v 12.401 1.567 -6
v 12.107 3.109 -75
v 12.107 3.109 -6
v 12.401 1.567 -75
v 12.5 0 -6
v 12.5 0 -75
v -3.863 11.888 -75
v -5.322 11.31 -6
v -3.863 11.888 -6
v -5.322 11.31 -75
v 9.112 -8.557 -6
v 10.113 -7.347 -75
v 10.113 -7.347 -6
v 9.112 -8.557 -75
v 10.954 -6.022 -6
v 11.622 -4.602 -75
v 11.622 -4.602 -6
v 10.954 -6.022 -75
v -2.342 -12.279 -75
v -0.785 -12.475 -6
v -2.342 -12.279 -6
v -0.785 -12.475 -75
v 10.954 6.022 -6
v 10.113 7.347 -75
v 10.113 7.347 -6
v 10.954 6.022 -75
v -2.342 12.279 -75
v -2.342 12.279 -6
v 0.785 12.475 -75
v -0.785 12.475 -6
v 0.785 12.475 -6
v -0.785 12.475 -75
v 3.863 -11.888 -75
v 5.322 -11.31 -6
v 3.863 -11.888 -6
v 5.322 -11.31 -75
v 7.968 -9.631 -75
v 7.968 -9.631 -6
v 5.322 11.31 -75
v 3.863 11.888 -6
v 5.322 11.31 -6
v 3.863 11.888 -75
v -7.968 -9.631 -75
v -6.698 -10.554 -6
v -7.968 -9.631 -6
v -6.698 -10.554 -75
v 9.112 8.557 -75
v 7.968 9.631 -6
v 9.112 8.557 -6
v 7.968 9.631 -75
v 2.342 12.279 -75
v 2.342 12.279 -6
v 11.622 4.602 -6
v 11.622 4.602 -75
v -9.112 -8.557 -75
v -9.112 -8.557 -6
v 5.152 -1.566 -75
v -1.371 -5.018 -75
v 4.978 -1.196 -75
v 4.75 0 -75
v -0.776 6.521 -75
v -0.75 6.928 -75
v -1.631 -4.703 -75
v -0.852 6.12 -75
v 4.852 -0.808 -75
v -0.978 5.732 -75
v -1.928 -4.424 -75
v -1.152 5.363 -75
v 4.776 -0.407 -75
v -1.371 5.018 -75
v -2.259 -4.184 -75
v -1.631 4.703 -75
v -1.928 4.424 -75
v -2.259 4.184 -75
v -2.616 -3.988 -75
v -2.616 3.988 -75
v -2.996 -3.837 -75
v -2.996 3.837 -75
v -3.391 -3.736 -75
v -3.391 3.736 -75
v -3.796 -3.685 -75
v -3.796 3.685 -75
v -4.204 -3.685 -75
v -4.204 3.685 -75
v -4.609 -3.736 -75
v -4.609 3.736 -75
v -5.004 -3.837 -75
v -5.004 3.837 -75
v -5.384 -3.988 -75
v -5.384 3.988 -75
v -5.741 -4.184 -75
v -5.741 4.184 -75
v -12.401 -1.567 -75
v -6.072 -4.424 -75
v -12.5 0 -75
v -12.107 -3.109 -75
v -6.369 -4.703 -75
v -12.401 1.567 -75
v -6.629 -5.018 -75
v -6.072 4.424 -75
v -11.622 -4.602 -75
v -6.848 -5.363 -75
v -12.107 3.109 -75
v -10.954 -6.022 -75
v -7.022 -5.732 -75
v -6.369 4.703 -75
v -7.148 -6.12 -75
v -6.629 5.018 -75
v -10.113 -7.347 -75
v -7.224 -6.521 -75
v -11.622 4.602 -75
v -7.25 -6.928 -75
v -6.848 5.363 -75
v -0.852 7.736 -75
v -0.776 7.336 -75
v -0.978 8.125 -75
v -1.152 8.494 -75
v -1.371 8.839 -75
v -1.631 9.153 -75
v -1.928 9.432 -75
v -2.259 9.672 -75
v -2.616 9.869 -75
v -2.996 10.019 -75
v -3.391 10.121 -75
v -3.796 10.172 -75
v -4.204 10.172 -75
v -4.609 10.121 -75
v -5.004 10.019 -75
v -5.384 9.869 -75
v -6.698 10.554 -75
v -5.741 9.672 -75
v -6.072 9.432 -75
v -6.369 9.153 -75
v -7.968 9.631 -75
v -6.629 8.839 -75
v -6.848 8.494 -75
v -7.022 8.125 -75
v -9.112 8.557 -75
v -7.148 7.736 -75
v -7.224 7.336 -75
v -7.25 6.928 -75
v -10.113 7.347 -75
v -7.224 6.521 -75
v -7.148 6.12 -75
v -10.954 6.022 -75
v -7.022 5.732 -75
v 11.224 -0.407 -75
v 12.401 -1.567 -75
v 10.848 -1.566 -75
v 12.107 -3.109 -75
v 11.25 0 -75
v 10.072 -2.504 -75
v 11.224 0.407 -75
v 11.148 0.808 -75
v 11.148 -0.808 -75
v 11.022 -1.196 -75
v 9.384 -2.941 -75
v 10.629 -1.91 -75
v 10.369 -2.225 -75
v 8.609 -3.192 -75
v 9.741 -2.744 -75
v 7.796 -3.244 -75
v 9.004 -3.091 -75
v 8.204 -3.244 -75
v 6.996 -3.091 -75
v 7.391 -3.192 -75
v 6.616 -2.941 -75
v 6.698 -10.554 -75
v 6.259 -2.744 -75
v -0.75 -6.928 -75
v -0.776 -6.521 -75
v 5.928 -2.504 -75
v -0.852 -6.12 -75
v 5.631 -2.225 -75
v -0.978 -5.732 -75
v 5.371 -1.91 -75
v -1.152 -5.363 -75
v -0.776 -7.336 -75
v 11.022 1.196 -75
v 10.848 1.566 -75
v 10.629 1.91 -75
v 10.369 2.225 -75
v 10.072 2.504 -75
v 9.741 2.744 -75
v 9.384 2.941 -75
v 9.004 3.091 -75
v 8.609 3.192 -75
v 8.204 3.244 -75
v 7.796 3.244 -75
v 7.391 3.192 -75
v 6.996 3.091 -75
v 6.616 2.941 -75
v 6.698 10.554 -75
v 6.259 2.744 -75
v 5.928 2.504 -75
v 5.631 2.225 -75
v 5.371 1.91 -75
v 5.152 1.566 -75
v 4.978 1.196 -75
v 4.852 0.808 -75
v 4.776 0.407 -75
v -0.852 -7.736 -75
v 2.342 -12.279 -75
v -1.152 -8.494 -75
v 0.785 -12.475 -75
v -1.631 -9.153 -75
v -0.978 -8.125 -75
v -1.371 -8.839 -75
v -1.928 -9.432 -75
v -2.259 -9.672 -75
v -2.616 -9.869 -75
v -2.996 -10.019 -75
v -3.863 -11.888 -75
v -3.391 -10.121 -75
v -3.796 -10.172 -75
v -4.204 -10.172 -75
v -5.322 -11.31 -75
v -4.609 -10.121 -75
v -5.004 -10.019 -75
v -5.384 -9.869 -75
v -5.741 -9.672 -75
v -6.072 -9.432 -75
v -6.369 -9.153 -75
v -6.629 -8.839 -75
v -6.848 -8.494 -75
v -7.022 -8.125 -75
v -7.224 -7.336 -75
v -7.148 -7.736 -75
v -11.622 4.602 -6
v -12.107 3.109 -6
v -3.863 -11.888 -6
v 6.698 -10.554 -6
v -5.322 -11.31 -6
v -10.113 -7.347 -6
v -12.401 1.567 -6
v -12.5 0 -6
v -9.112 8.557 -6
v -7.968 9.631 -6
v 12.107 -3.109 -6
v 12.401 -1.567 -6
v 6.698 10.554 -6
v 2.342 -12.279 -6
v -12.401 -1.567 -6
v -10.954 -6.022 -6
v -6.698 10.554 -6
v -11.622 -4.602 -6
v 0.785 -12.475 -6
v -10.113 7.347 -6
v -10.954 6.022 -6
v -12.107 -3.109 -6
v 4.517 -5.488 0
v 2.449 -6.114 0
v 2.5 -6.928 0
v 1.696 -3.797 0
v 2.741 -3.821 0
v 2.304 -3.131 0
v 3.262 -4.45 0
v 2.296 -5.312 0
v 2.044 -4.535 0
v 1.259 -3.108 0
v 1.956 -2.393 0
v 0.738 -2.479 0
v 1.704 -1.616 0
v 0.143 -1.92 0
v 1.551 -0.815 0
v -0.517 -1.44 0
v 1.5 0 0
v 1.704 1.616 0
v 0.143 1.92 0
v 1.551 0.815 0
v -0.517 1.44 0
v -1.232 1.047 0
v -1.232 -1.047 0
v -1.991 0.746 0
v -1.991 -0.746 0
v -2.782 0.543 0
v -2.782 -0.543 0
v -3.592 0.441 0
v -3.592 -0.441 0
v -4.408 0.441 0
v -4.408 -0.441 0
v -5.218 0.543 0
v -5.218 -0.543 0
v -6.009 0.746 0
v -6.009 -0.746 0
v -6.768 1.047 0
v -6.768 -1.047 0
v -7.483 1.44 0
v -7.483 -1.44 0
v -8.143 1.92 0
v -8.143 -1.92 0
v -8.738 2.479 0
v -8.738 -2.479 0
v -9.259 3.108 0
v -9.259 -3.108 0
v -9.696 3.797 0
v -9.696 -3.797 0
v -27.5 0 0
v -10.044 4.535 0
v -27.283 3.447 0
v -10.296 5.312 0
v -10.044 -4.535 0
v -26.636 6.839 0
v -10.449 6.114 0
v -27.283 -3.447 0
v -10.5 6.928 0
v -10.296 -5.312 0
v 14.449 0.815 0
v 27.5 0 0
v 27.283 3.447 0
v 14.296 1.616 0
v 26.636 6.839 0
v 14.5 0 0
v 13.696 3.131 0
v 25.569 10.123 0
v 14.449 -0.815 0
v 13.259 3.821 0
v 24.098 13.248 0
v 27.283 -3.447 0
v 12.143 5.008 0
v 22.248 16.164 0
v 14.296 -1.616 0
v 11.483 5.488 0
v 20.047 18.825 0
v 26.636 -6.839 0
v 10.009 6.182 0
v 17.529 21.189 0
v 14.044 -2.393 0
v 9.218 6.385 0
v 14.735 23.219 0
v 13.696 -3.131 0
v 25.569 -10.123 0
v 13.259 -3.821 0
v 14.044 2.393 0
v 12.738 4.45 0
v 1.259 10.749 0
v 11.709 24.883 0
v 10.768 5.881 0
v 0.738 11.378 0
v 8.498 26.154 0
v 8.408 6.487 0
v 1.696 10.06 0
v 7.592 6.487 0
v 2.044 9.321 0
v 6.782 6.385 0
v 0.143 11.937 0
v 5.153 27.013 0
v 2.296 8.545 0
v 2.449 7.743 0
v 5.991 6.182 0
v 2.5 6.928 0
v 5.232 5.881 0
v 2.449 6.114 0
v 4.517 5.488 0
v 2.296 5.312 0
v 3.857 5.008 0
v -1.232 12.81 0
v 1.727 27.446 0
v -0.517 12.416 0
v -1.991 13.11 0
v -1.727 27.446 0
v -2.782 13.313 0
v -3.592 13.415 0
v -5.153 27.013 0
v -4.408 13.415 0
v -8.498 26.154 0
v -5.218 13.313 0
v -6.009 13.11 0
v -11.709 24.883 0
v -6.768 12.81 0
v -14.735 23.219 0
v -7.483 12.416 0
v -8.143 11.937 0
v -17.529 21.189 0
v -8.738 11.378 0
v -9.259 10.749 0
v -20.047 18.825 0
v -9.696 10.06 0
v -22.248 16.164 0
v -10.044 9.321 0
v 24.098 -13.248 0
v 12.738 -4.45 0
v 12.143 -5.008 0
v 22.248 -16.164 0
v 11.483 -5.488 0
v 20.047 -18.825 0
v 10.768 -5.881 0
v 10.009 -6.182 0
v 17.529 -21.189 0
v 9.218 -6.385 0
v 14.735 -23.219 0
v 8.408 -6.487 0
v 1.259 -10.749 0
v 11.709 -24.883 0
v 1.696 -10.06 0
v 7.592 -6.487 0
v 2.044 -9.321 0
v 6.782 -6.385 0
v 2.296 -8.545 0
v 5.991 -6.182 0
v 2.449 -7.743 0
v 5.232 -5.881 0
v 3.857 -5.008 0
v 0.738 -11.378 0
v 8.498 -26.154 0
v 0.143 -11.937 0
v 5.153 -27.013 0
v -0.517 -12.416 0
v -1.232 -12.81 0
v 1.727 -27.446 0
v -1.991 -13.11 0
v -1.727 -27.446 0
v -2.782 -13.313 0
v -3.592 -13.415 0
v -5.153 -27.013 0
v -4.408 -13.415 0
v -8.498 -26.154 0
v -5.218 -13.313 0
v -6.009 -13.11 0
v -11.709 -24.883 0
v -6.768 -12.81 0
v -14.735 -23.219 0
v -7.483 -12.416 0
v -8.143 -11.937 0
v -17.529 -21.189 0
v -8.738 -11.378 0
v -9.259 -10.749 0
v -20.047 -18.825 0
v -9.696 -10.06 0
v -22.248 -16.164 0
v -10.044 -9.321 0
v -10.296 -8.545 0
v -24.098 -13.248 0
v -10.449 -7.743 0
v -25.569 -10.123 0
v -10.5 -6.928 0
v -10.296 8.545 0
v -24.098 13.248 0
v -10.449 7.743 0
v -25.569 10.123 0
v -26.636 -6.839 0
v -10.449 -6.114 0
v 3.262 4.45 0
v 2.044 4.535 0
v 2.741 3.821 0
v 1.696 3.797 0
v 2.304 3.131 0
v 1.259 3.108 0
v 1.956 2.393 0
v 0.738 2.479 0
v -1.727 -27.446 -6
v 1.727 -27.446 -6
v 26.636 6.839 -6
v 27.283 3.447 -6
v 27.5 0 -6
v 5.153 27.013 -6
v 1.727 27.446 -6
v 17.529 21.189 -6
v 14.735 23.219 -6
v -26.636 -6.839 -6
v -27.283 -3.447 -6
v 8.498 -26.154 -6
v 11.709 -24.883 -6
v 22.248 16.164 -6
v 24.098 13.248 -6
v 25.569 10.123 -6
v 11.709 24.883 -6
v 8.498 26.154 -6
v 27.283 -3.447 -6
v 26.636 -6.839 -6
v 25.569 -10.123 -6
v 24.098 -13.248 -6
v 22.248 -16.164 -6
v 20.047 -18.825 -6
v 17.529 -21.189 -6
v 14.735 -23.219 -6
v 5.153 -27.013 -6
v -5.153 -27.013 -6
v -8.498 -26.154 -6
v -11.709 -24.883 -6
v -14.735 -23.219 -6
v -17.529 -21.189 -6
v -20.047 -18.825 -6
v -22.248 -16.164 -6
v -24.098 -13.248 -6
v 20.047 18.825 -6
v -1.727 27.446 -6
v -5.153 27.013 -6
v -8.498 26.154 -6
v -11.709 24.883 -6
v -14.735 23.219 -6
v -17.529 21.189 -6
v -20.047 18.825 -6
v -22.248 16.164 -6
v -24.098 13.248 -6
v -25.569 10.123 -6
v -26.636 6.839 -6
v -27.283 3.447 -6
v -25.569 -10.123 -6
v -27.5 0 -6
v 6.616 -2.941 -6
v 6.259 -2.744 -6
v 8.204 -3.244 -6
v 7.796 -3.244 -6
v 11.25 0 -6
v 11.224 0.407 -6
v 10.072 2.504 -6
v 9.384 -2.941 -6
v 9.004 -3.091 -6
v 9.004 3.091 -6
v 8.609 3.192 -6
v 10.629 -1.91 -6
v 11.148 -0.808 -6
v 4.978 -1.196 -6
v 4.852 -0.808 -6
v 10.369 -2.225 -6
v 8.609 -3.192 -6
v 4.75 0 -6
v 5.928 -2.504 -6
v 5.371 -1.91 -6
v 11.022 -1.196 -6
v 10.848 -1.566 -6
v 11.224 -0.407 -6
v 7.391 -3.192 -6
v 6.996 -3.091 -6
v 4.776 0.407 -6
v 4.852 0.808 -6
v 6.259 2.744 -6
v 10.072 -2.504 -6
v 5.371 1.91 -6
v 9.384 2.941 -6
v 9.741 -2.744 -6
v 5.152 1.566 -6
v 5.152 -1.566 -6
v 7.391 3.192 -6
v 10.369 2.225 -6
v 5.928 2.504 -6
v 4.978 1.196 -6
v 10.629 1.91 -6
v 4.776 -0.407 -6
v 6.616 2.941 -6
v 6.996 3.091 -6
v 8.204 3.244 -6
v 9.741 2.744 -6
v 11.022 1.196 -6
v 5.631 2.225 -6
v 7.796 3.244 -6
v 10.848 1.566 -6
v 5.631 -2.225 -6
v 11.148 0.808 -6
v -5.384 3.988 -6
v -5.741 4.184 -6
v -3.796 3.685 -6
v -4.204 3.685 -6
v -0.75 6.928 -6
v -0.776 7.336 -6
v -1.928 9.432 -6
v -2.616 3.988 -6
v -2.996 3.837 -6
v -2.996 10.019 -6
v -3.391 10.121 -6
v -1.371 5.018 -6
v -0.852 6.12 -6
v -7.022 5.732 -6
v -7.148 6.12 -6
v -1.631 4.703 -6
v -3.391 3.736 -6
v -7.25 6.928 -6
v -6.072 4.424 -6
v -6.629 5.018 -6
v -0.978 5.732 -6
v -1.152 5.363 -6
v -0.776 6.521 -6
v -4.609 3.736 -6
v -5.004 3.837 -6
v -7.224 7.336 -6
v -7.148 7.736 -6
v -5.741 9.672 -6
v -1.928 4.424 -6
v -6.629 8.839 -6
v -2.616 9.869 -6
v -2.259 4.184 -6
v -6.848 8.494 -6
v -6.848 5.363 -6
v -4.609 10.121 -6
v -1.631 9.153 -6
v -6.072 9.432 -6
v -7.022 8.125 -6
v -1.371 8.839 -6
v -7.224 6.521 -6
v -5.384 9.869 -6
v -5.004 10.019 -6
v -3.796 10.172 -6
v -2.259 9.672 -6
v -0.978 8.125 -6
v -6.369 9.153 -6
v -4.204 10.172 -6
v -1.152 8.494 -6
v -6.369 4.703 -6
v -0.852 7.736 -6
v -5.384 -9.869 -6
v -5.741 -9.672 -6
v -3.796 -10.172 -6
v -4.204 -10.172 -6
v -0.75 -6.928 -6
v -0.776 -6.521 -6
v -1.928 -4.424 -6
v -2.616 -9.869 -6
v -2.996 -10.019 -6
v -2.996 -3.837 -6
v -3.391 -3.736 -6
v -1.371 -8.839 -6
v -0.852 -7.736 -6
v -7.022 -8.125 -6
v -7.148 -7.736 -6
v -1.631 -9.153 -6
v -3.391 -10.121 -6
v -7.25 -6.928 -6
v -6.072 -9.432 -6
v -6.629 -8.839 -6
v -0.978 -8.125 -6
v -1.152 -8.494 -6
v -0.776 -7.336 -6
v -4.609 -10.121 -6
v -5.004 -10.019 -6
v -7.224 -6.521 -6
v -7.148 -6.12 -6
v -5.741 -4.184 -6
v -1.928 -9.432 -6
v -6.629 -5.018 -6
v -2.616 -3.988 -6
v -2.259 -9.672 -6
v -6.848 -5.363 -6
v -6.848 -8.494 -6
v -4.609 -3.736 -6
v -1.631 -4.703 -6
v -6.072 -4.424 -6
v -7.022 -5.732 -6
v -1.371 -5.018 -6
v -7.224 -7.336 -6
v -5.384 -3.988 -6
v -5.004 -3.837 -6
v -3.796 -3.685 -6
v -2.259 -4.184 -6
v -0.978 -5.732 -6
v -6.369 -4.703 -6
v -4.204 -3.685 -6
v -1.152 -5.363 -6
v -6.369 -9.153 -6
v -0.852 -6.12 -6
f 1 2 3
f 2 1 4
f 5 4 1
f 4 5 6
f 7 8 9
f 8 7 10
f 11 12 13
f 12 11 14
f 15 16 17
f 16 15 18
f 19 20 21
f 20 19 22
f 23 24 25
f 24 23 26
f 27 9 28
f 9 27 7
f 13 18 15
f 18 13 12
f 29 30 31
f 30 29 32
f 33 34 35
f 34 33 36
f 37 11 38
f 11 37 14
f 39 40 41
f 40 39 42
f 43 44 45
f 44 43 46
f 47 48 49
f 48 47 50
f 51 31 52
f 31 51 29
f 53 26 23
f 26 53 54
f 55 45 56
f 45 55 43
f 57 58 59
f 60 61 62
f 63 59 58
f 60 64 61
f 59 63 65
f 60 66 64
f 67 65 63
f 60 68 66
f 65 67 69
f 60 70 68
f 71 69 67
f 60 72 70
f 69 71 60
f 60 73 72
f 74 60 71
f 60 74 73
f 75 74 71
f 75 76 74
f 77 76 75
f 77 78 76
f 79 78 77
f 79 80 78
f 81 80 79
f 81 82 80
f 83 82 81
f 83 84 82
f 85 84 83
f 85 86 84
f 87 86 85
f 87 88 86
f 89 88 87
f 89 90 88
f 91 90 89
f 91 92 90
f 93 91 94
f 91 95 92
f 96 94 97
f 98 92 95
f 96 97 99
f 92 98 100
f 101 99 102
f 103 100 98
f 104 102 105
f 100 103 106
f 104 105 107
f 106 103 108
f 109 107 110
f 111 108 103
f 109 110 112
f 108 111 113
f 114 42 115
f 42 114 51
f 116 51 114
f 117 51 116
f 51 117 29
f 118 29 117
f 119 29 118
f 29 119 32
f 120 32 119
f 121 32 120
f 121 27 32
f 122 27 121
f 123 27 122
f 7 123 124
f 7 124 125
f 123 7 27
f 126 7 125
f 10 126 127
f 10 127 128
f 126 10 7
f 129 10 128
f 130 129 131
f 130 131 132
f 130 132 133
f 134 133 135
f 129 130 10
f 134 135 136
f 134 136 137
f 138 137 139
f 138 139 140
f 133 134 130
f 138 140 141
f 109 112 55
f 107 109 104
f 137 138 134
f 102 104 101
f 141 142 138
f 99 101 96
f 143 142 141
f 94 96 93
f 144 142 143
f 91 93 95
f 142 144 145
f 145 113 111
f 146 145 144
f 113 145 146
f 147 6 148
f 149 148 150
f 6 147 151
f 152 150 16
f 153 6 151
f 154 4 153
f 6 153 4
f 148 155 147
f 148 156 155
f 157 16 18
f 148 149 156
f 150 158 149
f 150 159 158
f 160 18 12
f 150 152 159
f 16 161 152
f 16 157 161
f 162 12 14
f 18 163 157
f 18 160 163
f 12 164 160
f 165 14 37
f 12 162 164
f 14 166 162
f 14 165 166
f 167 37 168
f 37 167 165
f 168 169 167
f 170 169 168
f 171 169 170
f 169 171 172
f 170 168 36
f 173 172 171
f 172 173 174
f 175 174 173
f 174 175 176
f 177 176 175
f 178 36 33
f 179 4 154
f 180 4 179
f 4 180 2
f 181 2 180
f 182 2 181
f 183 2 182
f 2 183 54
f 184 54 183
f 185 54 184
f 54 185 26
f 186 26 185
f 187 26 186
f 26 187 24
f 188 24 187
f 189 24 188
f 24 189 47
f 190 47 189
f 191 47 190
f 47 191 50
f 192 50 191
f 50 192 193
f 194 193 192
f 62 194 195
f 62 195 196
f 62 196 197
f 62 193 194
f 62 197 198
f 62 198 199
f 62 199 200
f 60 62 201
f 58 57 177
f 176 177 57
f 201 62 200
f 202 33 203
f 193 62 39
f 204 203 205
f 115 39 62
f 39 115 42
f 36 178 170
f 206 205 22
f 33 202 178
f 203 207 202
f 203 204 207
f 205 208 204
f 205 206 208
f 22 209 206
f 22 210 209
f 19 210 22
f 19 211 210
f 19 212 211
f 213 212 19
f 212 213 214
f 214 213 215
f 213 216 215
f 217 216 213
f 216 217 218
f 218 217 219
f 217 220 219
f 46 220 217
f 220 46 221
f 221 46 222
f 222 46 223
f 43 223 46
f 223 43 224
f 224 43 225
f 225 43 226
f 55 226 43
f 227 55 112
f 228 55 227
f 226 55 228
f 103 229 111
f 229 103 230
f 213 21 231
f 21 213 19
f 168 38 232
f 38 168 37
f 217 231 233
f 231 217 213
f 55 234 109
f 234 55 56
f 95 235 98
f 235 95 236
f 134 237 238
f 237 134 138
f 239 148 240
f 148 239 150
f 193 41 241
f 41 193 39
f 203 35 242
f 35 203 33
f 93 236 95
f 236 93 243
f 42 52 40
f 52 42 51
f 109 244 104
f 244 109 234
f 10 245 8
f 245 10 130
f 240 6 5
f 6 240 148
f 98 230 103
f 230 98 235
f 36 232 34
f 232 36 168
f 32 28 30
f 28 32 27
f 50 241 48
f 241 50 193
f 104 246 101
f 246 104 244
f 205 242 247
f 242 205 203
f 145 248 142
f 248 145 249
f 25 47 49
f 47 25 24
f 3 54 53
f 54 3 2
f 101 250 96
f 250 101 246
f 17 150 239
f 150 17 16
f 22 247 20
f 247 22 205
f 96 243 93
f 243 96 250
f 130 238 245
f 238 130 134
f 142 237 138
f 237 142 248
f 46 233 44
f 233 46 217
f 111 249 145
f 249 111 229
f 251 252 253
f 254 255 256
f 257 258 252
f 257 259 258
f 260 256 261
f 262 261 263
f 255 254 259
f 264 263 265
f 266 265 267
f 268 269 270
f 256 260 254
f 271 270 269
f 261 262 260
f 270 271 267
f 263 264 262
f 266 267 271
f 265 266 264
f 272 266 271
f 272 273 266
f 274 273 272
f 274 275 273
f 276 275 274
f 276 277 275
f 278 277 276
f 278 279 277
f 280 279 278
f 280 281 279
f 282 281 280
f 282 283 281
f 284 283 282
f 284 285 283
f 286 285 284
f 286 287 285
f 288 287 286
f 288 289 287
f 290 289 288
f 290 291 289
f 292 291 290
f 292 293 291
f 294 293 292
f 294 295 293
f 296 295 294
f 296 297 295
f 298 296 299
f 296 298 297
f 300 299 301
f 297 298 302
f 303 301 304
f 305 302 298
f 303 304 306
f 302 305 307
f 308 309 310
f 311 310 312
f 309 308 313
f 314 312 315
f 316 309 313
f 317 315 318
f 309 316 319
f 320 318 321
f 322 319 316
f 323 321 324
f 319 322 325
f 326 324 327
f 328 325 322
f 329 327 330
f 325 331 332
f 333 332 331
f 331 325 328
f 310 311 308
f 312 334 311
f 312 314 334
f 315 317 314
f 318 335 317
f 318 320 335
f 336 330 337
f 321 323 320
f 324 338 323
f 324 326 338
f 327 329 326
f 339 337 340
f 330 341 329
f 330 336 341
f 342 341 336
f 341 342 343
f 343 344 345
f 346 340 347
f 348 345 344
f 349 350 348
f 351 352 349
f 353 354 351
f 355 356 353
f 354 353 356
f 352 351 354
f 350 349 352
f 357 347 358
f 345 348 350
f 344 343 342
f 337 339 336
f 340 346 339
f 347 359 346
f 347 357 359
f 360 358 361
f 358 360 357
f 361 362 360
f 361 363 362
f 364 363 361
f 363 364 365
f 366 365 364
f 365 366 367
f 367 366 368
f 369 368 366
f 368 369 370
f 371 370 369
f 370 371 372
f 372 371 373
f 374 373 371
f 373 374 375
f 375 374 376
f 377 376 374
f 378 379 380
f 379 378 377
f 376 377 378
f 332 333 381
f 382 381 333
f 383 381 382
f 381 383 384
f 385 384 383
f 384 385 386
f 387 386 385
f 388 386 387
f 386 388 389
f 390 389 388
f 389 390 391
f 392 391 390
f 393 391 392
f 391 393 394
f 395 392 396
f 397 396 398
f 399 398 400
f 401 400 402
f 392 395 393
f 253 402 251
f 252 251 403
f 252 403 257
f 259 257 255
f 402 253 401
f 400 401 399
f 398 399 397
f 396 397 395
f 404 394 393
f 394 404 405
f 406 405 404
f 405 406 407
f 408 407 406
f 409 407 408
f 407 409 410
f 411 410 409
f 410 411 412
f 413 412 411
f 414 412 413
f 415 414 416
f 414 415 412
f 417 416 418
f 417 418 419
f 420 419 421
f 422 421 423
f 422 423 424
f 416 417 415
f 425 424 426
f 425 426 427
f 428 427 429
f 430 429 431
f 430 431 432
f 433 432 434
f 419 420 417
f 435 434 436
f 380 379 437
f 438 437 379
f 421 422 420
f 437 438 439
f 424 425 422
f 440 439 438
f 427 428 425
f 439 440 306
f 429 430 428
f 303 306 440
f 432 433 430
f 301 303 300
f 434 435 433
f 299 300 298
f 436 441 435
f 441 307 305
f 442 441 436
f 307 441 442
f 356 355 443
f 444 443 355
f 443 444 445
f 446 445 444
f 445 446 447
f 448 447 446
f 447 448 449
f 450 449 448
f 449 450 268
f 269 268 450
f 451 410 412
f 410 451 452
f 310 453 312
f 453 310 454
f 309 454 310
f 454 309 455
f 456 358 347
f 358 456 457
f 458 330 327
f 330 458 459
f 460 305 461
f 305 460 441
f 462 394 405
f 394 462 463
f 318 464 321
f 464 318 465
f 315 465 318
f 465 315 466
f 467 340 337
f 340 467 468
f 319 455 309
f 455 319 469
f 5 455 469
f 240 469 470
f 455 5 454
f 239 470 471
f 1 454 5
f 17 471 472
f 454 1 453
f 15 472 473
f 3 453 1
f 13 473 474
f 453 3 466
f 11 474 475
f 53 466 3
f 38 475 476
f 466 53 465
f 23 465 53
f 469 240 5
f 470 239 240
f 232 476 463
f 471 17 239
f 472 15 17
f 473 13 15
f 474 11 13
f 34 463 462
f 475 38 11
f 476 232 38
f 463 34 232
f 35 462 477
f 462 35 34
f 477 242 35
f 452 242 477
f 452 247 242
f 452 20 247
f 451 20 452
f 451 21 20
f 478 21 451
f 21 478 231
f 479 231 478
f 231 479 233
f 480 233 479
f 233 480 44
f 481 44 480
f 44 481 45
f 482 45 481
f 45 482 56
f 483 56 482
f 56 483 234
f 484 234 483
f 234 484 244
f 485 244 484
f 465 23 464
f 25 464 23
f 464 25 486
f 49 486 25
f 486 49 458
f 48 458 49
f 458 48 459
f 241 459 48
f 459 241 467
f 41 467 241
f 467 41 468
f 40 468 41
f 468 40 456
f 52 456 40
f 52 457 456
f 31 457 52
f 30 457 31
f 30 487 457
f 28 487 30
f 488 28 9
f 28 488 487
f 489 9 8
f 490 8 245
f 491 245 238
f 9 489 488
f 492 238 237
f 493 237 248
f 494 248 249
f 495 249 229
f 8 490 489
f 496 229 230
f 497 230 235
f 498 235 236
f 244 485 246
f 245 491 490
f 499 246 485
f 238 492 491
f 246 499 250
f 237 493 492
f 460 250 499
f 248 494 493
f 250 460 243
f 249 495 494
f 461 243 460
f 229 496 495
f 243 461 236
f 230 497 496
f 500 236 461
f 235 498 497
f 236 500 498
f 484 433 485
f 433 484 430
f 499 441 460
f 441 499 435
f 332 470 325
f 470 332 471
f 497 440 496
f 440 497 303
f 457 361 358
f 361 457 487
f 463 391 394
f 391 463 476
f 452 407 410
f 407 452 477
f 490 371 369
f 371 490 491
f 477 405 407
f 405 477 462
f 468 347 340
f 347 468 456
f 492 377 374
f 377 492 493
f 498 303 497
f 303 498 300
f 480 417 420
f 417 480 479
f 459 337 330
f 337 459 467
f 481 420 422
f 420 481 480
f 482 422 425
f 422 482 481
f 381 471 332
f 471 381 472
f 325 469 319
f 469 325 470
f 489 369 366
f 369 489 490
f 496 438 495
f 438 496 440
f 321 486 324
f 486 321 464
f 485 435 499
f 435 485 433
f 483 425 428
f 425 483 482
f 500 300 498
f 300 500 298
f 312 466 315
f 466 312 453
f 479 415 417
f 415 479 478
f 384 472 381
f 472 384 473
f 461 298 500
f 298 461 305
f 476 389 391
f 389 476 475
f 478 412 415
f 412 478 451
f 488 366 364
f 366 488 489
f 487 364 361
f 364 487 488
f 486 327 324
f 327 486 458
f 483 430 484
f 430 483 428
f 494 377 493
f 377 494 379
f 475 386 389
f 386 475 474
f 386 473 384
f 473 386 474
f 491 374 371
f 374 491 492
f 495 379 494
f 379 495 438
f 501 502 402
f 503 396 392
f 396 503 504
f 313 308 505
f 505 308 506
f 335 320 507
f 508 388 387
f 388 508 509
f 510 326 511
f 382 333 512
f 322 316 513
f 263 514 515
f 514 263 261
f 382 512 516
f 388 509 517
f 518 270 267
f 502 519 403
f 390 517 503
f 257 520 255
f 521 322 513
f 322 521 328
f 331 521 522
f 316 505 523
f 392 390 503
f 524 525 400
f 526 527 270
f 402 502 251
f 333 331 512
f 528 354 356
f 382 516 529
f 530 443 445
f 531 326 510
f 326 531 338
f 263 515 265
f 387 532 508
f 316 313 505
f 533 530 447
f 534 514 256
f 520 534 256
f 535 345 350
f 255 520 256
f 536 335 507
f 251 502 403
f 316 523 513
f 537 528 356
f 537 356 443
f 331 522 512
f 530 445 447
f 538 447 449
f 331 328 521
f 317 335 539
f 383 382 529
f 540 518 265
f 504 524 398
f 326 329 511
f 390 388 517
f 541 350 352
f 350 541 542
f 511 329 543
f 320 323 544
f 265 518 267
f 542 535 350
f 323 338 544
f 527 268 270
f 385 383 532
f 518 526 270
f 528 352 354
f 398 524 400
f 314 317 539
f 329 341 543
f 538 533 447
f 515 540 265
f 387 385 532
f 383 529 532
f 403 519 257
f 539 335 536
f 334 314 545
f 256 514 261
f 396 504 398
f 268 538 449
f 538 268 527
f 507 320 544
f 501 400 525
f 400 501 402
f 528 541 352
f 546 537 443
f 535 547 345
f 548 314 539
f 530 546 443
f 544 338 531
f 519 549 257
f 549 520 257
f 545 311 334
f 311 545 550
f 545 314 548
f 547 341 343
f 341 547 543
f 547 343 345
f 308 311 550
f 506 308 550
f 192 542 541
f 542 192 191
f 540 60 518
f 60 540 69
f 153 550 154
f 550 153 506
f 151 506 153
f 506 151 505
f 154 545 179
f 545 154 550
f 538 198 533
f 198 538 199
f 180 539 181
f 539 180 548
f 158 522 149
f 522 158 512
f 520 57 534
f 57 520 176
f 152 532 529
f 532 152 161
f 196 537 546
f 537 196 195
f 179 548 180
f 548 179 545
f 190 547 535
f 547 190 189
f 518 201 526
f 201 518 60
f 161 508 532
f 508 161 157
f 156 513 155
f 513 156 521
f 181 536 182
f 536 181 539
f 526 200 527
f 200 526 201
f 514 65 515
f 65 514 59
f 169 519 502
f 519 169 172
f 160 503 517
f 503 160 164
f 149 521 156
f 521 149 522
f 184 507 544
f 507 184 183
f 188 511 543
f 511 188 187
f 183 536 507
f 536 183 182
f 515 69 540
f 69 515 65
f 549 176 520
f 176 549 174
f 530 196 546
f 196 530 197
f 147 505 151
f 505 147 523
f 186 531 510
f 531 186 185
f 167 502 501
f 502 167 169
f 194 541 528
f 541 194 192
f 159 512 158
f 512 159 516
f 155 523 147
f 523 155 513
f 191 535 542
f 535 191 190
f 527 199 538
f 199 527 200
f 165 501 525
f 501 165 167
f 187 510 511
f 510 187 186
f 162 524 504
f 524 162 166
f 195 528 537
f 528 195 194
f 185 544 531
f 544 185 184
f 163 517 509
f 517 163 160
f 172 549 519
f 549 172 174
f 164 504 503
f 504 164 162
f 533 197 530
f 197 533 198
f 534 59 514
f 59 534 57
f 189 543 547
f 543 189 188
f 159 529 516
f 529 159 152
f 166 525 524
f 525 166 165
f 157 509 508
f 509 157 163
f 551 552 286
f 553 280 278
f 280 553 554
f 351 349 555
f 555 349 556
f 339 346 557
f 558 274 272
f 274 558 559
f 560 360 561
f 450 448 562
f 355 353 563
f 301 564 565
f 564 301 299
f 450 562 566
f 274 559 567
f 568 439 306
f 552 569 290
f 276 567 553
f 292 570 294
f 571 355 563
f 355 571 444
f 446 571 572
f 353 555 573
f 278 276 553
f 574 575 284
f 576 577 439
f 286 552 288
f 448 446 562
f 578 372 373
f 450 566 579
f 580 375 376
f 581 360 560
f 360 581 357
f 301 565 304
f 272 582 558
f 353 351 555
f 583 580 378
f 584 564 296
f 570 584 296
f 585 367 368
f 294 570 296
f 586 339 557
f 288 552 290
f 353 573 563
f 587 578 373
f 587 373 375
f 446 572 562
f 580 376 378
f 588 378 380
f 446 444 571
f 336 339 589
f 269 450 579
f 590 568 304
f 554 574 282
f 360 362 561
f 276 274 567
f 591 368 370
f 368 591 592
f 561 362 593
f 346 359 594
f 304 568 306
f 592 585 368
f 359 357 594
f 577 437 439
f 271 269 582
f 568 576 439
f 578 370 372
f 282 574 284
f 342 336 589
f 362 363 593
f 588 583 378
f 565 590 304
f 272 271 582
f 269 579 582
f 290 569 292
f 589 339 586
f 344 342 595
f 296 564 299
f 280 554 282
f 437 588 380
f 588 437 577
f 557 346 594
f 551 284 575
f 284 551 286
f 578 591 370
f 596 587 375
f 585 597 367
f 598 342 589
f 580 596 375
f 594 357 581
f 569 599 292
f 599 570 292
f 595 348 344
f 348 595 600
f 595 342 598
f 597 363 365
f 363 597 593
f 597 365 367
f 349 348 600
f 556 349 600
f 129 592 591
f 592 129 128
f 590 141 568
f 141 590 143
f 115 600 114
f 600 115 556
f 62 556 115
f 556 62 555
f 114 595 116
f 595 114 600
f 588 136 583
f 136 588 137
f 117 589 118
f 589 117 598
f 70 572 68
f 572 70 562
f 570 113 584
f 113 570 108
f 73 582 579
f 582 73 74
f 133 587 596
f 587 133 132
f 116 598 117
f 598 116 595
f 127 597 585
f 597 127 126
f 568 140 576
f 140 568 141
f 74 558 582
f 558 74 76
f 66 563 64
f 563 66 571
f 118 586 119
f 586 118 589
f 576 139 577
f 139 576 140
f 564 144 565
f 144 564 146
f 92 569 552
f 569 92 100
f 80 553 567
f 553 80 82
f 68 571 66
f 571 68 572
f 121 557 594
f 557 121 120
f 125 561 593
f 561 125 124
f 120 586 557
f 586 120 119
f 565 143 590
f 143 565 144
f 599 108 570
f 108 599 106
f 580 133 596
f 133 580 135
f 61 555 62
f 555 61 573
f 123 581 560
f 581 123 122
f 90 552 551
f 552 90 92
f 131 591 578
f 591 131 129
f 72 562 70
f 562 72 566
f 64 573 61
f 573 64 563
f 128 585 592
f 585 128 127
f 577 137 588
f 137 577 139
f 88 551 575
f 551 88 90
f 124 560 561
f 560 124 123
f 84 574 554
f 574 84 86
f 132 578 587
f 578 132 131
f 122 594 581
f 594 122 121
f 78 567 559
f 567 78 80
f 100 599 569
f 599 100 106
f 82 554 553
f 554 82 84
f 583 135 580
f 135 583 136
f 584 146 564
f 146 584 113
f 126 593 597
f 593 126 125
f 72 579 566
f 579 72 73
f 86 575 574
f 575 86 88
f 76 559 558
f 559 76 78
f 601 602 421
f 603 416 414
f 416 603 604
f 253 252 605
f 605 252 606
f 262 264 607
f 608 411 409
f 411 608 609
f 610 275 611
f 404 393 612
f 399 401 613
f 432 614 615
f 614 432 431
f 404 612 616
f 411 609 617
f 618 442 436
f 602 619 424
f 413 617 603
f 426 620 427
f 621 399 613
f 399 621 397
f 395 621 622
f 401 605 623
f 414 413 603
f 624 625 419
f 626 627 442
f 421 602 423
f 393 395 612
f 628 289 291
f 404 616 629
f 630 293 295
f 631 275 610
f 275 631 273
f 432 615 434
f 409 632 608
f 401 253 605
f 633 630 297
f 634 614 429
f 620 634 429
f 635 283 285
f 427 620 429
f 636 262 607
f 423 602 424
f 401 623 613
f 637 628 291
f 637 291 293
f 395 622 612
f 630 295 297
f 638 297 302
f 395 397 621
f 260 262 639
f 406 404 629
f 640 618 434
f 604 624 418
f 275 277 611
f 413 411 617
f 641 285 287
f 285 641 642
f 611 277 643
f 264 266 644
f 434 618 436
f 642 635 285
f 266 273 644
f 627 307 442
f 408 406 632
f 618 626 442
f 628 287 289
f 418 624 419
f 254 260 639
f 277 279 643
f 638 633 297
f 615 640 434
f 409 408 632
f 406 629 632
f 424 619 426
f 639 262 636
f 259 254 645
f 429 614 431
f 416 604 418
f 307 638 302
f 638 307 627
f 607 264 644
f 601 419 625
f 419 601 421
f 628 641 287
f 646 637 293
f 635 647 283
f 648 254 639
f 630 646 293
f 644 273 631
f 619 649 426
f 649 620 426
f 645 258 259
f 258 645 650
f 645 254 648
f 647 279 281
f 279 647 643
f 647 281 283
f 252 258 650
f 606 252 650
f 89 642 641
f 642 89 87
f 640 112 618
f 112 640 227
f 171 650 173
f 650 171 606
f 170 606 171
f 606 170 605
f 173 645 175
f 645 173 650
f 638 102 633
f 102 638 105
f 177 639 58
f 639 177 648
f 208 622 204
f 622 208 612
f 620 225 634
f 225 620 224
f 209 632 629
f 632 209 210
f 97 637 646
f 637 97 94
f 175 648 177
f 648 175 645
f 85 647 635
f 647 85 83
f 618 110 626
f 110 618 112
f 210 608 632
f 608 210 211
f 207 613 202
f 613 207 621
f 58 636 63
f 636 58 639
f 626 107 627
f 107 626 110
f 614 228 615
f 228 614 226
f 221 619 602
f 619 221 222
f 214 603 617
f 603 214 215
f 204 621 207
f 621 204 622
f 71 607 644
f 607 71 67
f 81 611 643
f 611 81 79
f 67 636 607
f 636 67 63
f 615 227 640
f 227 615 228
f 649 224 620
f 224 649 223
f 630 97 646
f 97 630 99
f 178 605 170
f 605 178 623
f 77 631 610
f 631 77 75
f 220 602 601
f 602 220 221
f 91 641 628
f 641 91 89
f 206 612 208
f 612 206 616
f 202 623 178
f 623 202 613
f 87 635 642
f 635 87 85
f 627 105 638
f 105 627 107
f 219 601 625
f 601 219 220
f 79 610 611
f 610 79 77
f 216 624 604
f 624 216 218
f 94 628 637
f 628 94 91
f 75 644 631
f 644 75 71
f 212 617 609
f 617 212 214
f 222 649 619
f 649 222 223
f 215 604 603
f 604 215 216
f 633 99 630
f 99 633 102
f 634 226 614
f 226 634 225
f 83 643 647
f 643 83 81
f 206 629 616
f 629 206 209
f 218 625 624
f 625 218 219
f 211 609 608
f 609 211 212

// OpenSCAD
$fn = 50;


difference() {
	union() {
		translate(v = [0, 0, -75.0000000000]) {
			cylinder(h = 75, r = 12.5000000000);
		}
		translate(v = [0, 0, -6.0000000000]) {
			cylinder(h = 6, r = 27.5000000000);
		}
	}
	union() {
		translate(v = [8.0000000000, 0.0000000000, 0]) {
			rotate(a = [0, 0, 0]) {
				difference() {
					union() {
						#translate(v = [0, 0, -75.0000000000]) {
							cylinder(h = 75, r = 2.2500000000);
						}
						#translate(v = [0, 0, -6]) {
							cylinder(h = 6, r = 12.5000000000, r1 = 3.2500000000, r2 = 6.5000000000);
						}
						#translate(v = [0, 0, -75.0000000000]) {
							cylinder(h = 75, r = 3.2500000000);
						}
						#translate(v = [0, 0, -75.0000000000]) {
							cylinder(h = 75, r = 2.2500000000);
						}
					}
					union();
				}
			}
		}
		translate(v = [-4.0000000000, 6.9282032303, 0]) {
			rotate(a = [0, 0, 0]) {
				difference() {
					union() {
						#translate(v = [0, 0, -75.0000000000]) {
							cylinder(h = 75, r = 2.2500000000);
						}
						#translate(v = [0, 0, -6]) {
							cylinder(h = 6, r = 12.5000000000, r1 = 3.2500000000, r2 = 6.5000000000);
						}
						#translate(v = [0, 0, -75.0000000000]) {
							cylinder(h = 75, r = 3.2500000000);
						}
						#translate(v = [0, 0, -75.0000000000]) {
							cylinder(h = 75, r = 2.2500000000);
						}
					}
					union();
				}
			}
		}
		translate(v = [-4.0000000000, -6.9282032303, 0]) {
			rotate(a = [0, 0, 0]) {
				difference() {
					union() {
						#translate(v = [0, 0, -75.0000000000]) {
							cylinder(h = 75, r = 2.2500000000);
						}
						#translate(v = [0, 0, -6]) {
							cylinder(h = 6, r = 12.5000000000, r1 = 3.2500000000, r2 = 6.5000000000);
						}
						#translate(v = [0, 0, -75.0000000000]) {
							cylinder(h = 75, r = 3.2500000000);
						}
						#translate(v = [0, 0, -75.0000000000]) {
							cylinder(h = 75, r = 2.2500000000);
						}
					}
					union();
				}
			}
		}
	}
}
